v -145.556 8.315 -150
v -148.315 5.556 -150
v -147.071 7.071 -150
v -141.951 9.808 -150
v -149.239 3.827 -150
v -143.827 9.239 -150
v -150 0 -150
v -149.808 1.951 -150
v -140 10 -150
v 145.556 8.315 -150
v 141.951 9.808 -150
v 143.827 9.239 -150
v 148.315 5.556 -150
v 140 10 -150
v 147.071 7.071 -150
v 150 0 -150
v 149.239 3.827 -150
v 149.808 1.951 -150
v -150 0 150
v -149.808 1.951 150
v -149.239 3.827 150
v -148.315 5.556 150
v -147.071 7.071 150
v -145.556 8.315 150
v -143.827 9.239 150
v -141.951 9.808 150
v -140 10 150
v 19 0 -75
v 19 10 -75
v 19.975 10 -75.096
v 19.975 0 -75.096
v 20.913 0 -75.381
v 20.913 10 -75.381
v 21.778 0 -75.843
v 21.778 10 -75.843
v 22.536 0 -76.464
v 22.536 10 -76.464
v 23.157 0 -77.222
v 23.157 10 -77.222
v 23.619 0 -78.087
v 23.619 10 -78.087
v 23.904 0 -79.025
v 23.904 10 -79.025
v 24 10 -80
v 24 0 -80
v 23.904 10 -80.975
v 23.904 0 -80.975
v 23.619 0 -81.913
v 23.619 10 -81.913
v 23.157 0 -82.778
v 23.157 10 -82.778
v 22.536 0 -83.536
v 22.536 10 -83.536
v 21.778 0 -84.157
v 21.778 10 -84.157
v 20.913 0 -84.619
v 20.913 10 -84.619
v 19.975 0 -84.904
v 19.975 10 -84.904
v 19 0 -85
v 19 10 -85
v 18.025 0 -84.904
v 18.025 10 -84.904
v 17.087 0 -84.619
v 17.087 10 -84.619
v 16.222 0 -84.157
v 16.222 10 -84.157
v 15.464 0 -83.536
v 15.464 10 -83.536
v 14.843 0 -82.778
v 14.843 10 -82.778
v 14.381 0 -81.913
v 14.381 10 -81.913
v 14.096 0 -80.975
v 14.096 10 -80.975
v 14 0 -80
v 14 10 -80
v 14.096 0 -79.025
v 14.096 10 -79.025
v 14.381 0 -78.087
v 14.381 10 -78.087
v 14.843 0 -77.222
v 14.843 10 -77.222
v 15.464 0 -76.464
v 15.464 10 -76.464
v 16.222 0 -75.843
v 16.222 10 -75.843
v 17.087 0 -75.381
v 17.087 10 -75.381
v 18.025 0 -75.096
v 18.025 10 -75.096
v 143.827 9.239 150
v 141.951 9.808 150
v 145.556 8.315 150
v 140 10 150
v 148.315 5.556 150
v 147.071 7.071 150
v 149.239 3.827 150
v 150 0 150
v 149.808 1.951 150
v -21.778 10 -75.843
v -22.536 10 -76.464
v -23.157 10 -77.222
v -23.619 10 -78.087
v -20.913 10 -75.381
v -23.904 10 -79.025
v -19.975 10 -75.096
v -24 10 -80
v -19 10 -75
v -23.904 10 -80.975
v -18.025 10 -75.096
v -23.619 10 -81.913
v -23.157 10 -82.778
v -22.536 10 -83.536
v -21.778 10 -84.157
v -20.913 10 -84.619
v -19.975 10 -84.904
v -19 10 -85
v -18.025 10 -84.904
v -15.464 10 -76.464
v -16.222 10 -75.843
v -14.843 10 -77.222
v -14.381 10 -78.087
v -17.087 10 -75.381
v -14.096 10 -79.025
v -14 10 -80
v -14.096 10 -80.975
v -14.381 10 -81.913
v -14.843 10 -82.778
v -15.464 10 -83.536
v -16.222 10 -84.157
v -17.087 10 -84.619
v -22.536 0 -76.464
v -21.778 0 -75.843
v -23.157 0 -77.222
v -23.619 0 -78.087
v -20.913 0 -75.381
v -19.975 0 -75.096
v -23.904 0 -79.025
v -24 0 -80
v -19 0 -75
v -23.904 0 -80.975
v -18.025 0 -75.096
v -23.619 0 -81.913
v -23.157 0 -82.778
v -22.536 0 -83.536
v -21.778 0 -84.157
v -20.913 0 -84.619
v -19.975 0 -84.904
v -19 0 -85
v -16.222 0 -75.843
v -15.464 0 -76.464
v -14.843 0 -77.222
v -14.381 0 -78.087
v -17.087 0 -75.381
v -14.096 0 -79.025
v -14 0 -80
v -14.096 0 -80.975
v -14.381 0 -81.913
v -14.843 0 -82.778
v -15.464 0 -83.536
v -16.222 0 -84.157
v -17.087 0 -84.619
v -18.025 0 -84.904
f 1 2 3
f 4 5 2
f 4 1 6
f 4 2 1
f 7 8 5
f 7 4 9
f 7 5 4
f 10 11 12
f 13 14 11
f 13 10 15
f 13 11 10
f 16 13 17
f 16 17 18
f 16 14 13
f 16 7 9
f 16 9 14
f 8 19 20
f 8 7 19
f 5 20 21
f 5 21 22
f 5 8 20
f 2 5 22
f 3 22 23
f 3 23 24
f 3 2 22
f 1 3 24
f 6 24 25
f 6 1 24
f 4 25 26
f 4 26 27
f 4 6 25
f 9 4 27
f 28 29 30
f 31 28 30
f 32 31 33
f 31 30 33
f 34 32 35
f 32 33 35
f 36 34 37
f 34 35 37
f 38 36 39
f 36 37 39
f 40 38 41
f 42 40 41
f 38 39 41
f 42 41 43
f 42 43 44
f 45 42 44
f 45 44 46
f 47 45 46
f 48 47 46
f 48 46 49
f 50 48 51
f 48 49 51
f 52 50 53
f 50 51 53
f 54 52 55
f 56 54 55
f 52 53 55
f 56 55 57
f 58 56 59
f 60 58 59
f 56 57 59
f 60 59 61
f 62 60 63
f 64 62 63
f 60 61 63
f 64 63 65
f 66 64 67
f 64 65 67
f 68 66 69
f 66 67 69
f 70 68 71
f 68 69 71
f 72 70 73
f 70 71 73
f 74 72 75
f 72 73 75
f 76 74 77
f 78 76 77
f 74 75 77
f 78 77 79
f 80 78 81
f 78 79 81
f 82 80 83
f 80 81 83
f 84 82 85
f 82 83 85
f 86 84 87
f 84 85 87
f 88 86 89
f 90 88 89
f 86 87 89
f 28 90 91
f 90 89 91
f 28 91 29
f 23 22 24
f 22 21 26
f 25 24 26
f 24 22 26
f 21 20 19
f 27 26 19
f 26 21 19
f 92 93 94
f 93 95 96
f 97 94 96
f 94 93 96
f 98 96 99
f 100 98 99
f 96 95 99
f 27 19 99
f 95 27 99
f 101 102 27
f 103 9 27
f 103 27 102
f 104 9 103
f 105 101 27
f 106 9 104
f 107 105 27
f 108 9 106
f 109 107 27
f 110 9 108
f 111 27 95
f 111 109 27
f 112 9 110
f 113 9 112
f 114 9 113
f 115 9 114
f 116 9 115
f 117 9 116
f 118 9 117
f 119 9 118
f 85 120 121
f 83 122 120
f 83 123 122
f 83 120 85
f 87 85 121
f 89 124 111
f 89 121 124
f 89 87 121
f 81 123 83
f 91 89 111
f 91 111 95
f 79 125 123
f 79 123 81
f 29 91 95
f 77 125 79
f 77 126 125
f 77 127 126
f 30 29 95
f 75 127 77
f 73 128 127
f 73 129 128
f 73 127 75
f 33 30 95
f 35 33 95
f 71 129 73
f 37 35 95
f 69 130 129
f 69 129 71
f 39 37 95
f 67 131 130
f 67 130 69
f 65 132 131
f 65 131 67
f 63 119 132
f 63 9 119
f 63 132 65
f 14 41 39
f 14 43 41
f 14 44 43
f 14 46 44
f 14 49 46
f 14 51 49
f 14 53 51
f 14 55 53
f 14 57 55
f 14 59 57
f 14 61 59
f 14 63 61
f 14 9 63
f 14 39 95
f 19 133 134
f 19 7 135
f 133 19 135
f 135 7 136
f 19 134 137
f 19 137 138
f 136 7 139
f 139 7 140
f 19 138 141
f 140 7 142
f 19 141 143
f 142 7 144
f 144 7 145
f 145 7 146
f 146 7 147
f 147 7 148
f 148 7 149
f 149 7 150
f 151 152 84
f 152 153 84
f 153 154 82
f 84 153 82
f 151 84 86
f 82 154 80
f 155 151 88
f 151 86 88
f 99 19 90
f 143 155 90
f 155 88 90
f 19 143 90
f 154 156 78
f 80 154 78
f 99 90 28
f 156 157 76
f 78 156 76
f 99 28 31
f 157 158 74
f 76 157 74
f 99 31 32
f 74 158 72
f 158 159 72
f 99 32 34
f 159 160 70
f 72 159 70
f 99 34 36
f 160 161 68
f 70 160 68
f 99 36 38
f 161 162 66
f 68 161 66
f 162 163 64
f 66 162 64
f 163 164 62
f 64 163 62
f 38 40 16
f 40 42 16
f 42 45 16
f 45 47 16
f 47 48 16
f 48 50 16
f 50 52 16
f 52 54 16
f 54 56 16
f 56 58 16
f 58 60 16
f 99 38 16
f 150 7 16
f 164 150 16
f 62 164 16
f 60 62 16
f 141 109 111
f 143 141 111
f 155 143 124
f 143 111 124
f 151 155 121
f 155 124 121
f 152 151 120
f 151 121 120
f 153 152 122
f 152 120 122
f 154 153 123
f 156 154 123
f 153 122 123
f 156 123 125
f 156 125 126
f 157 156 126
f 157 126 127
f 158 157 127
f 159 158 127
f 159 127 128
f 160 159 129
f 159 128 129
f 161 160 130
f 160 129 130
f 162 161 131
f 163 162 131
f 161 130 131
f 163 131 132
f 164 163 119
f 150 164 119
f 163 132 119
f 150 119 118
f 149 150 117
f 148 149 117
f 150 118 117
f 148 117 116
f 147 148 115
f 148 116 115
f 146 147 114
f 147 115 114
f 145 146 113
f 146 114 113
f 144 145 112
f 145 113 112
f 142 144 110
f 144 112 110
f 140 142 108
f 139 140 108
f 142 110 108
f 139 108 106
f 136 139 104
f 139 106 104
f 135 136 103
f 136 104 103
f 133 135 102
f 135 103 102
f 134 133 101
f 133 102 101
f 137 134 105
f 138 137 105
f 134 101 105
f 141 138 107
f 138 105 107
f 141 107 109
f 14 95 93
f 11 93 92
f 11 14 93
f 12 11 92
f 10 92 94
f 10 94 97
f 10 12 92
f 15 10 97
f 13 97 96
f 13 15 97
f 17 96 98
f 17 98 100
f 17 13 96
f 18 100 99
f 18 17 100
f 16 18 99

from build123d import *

# Parameters (mm, degrees)
SKETCH1_W           = 300
SKETCH1_H           = 300
BOSS_EXTRUDE1_DEPTH = 10
SKETCH2_R           = 5
CUT_EXTRUDE1_DEPTH  = 10
FILLET2_R           = 10
FILLET3_R           = 10


with BuildPart() as part:
    # Sketch1 → Boss-Extrude1 (new body)
    with BuildSketch(Plane(origin=(0, 0, 0), x_dir=(1, 0, 0), z_dir=(0, 1, 0))):
        Rectangle(SKETCH1_W, SKETCH1_H)
    extrude(amount=BOSS_EXTRUDE1_DEPTH)

    # Sketch2 → Cut-Extrude1 (cut)
    with BuildSketch(Plane(origin=(0, 10, 0), x_dir=(1, 0, 0), z_dir=(0, 1, 0))):
        with Locations(Location((-19, 80, 0), (0, 0, 270))):
            Circle(SKETCH2_R)
        with Locations(Location((19, 80, 0), (0, 0, 270))):
            Circle(SKETCH2_R)
    extrude(amount=-CUT_EXTRUDE1_DEPTH, mode=Mode.SUBTRACT)

    # Fillet2
    fillet2_edges = [part.edges().sort_by_distance(p)[0] for p in [
        (-150, 10, 0),
    ]]
    fillet(fillet2_edges, radius=FILLET2_R - 0.0001)  # a hair under: the kernel refuses the full size

    # Fillet3
    fillet3_edges = [part.edges().sort_by_distance(p)[0] for p in [
        (150, 10, 0),
    ]]
    fillet(fillet3_edges, radius=FILLET3_R - 0.0001)  # a hair under: the kernel refuses the full size


solid = part.part
